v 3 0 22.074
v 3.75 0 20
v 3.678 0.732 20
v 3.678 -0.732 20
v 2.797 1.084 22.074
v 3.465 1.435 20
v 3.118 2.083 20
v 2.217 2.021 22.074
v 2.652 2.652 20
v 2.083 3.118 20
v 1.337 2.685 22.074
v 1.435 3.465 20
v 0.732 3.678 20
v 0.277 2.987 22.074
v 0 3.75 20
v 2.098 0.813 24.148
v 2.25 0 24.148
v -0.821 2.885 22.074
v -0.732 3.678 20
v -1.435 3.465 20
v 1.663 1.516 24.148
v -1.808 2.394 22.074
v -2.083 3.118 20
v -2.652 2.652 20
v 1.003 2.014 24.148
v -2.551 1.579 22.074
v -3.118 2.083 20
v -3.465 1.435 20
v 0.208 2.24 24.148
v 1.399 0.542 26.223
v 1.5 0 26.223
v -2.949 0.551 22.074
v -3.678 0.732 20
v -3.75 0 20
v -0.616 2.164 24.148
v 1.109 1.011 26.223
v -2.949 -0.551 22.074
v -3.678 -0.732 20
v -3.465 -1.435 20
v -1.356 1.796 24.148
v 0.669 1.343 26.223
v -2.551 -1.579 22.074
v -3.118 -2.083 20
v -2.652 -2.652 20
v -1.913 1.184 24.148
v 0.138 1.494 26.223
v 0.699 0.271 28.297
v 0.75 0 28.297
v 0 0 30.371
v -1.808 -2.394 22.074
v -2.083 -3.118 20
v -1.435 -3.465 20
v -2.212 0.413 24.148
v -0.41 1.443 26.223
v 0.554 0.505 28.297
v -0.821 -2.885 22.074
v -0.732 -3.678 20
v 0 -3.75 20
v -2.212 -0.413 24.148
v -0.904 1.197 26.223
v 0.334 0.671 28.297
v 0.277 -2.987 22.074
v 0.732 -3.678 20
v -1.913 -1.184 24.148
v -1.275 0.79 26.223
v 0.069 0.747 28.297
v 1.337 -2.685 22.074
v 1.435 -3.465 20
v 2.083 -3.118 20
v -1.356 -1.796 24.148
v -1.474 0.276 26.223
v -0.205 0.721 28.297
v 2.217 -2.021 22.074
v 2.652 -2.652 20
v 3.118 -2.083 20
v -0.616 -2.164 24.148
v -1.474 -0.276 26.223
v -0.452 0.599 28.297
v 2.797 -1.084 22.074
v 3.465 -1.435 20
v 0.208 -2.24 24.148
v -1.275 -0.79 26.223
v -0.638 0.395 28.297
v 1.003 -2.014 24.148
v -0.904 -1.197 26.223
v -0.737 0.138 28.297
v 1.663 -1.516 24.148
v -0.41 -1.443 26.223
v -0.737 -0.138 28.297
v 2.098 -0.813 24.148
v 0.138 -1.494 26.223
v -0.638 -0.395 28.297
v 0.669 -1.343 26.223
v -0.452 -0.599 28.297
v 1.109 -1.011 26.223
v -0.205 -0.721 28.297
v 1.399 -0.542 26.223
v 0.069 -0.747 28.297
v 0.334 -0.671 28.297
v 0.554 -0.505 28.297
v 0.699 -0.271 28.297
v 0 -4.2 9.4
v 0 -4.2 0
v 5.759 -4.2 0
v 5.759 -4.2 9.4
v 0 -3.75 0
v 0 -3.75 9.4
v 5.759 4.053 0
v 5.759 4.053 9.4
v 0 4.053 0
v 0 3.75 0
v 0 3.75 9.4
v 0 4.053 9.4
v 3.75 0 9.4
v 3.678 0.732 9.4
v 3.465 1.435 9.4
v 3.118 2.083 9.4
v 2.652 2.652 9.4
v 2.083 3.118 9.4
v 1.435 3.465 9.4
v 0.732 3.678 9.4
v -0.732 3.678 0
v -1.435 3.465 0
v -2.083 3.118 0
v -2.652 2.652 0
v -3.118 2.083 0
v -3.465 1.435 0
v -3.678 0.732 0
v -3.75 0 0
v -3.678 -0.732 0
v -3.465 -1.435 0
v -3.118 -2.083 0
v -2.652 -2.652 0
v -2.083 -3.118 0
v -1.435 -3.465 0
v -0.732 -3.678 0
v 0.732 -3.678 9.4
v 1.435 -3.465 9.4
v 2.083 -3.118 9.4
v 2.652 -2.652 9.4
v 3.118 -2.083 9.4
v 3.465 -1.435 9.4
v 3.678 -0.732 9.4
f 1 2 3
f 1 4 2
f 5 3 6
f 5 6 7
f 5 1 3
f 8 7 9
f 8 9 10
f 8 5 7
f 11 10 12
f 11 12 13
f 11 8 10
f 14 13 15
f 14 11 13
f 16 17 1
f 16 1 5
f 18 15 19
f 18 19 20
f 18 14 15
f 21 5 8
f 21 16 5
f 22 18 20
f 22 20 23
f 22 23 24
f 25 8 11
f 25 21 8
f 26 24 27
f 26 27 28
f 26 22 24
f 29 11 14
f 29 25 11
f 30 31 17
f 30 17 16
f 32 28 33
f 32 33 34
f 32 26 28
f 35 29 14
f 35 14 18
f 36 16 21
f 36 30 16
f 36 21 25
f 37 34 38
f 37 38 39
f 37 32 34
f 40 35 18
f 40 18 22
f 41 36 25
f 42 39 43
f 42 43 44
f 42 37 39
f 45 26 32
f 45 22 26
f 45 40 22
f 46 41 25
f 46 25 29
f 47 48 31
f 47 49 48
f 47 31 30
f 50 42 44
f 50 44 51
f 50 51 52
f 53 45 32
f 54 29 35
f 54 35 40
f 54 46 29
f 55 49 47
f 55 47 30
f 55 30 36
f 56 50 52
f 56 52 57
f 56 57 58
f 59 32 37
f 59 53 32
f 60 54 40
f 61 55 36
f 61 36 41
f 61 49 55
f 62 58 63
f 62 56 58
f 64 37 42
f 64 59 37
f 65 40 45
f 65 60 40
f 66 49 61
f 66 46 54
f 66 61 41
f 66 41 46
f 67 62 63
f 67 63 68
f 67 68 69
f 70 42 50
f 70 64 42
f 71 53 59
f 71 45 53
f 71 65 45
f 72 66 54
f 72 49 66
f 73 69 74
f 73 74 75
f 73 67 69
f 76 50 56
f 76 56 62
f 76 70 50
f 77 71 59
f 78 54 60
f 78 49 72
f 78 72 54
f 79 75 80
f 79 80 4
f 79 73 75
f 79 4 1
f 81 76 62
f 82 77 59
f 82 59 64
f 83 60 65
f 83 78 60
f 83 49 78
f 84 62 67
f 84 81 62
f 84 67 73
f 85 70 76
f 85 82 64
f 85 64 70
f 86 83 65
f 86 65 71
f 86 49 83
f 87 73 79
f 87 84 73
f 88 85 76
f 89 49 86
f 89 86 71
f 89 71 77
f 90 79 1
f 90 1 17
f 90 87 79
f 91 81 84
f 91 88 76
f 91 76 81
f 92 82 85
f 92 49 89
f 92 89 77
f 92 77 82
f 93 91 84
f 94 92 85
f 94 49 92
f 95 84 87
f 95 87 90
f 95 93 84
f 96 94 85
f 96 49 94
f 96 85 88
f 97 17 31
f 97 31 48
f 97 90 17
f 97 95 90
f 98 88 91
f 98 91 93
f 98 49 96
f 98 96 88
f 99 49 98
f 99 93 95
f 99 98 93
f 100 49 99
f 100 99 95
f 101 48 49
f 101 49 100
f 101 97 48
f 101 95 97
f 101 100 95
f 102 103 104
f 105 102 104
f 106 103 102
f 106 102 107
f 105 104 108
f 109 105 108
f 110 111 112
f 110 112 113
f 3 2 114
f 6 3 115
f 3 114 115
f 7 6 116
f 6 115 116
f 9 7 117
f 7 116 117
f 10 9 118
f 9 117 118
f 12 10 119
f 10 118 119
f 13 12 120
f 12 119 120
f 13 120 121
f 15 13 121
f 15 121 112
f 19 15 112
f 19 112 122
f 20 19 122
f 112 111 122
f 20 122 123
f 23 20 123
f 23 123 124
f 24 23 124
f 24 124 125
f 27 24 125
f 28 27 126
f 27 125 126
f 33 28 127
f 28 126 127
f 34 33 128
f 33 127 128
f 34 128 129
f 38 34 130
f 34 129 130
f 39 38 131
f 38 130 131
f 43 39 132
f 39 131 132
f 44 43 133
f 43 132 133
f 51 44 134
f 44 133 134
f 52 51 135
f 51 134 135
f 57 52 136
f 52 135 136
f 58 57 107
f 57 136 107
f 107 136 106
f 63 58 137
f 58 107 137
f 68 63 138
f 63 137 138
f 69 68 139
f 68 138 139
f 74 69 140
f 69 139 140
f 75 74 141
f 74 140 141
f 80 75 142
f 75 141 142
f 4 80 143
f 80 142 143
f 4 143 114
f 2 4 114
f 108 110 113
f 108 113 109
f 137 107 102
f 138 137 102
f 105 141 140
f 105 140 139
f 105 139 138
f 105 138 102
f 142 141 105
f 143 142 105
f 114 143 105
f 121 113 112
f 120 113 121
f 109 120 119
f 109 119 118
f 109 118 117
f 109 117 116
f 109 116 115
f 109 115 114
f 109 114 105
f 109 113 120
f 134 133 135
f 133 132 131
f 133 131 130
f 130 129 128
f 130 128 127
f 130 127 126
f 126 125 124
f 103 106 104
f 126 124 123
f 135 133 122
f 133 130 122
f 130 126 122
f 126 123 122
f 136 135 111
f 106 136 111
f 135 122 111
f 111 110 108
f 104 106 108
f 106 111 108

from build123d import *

# Parameters (mm, degrees)
F0_R     = 3.75
F1_DEPTH = 20
F2_W     = 5.758919
F2_H     = 8.252938
F3_DEPTH = 9.4


with BuildPart() as f1:
    # F0 (on Top) → F1 (new body)
    with BuildSketch(Plane.XY):
        Circle(F0_R)
    extrude(amount=F1_DEPTH)

    # F2 (on Top) → F3 (join)
    with BuildSketch(Plane.XY):
        with Locations((2.879459, -0.073531)):
            Rectangle(F2_W, F2_H)
    extrude(amount=F3_DEPTH)

    # F4 (on Front) → F5 (revolve)
    with BuildSketch(Plane.XZ):
        Polygon((0, 30.37099), (0, 20), (3.750007, 20), align=None)
    revolve(axis=Axis((0, 0, 25.185495), (0, 0, 1)))


solid = f1.part
